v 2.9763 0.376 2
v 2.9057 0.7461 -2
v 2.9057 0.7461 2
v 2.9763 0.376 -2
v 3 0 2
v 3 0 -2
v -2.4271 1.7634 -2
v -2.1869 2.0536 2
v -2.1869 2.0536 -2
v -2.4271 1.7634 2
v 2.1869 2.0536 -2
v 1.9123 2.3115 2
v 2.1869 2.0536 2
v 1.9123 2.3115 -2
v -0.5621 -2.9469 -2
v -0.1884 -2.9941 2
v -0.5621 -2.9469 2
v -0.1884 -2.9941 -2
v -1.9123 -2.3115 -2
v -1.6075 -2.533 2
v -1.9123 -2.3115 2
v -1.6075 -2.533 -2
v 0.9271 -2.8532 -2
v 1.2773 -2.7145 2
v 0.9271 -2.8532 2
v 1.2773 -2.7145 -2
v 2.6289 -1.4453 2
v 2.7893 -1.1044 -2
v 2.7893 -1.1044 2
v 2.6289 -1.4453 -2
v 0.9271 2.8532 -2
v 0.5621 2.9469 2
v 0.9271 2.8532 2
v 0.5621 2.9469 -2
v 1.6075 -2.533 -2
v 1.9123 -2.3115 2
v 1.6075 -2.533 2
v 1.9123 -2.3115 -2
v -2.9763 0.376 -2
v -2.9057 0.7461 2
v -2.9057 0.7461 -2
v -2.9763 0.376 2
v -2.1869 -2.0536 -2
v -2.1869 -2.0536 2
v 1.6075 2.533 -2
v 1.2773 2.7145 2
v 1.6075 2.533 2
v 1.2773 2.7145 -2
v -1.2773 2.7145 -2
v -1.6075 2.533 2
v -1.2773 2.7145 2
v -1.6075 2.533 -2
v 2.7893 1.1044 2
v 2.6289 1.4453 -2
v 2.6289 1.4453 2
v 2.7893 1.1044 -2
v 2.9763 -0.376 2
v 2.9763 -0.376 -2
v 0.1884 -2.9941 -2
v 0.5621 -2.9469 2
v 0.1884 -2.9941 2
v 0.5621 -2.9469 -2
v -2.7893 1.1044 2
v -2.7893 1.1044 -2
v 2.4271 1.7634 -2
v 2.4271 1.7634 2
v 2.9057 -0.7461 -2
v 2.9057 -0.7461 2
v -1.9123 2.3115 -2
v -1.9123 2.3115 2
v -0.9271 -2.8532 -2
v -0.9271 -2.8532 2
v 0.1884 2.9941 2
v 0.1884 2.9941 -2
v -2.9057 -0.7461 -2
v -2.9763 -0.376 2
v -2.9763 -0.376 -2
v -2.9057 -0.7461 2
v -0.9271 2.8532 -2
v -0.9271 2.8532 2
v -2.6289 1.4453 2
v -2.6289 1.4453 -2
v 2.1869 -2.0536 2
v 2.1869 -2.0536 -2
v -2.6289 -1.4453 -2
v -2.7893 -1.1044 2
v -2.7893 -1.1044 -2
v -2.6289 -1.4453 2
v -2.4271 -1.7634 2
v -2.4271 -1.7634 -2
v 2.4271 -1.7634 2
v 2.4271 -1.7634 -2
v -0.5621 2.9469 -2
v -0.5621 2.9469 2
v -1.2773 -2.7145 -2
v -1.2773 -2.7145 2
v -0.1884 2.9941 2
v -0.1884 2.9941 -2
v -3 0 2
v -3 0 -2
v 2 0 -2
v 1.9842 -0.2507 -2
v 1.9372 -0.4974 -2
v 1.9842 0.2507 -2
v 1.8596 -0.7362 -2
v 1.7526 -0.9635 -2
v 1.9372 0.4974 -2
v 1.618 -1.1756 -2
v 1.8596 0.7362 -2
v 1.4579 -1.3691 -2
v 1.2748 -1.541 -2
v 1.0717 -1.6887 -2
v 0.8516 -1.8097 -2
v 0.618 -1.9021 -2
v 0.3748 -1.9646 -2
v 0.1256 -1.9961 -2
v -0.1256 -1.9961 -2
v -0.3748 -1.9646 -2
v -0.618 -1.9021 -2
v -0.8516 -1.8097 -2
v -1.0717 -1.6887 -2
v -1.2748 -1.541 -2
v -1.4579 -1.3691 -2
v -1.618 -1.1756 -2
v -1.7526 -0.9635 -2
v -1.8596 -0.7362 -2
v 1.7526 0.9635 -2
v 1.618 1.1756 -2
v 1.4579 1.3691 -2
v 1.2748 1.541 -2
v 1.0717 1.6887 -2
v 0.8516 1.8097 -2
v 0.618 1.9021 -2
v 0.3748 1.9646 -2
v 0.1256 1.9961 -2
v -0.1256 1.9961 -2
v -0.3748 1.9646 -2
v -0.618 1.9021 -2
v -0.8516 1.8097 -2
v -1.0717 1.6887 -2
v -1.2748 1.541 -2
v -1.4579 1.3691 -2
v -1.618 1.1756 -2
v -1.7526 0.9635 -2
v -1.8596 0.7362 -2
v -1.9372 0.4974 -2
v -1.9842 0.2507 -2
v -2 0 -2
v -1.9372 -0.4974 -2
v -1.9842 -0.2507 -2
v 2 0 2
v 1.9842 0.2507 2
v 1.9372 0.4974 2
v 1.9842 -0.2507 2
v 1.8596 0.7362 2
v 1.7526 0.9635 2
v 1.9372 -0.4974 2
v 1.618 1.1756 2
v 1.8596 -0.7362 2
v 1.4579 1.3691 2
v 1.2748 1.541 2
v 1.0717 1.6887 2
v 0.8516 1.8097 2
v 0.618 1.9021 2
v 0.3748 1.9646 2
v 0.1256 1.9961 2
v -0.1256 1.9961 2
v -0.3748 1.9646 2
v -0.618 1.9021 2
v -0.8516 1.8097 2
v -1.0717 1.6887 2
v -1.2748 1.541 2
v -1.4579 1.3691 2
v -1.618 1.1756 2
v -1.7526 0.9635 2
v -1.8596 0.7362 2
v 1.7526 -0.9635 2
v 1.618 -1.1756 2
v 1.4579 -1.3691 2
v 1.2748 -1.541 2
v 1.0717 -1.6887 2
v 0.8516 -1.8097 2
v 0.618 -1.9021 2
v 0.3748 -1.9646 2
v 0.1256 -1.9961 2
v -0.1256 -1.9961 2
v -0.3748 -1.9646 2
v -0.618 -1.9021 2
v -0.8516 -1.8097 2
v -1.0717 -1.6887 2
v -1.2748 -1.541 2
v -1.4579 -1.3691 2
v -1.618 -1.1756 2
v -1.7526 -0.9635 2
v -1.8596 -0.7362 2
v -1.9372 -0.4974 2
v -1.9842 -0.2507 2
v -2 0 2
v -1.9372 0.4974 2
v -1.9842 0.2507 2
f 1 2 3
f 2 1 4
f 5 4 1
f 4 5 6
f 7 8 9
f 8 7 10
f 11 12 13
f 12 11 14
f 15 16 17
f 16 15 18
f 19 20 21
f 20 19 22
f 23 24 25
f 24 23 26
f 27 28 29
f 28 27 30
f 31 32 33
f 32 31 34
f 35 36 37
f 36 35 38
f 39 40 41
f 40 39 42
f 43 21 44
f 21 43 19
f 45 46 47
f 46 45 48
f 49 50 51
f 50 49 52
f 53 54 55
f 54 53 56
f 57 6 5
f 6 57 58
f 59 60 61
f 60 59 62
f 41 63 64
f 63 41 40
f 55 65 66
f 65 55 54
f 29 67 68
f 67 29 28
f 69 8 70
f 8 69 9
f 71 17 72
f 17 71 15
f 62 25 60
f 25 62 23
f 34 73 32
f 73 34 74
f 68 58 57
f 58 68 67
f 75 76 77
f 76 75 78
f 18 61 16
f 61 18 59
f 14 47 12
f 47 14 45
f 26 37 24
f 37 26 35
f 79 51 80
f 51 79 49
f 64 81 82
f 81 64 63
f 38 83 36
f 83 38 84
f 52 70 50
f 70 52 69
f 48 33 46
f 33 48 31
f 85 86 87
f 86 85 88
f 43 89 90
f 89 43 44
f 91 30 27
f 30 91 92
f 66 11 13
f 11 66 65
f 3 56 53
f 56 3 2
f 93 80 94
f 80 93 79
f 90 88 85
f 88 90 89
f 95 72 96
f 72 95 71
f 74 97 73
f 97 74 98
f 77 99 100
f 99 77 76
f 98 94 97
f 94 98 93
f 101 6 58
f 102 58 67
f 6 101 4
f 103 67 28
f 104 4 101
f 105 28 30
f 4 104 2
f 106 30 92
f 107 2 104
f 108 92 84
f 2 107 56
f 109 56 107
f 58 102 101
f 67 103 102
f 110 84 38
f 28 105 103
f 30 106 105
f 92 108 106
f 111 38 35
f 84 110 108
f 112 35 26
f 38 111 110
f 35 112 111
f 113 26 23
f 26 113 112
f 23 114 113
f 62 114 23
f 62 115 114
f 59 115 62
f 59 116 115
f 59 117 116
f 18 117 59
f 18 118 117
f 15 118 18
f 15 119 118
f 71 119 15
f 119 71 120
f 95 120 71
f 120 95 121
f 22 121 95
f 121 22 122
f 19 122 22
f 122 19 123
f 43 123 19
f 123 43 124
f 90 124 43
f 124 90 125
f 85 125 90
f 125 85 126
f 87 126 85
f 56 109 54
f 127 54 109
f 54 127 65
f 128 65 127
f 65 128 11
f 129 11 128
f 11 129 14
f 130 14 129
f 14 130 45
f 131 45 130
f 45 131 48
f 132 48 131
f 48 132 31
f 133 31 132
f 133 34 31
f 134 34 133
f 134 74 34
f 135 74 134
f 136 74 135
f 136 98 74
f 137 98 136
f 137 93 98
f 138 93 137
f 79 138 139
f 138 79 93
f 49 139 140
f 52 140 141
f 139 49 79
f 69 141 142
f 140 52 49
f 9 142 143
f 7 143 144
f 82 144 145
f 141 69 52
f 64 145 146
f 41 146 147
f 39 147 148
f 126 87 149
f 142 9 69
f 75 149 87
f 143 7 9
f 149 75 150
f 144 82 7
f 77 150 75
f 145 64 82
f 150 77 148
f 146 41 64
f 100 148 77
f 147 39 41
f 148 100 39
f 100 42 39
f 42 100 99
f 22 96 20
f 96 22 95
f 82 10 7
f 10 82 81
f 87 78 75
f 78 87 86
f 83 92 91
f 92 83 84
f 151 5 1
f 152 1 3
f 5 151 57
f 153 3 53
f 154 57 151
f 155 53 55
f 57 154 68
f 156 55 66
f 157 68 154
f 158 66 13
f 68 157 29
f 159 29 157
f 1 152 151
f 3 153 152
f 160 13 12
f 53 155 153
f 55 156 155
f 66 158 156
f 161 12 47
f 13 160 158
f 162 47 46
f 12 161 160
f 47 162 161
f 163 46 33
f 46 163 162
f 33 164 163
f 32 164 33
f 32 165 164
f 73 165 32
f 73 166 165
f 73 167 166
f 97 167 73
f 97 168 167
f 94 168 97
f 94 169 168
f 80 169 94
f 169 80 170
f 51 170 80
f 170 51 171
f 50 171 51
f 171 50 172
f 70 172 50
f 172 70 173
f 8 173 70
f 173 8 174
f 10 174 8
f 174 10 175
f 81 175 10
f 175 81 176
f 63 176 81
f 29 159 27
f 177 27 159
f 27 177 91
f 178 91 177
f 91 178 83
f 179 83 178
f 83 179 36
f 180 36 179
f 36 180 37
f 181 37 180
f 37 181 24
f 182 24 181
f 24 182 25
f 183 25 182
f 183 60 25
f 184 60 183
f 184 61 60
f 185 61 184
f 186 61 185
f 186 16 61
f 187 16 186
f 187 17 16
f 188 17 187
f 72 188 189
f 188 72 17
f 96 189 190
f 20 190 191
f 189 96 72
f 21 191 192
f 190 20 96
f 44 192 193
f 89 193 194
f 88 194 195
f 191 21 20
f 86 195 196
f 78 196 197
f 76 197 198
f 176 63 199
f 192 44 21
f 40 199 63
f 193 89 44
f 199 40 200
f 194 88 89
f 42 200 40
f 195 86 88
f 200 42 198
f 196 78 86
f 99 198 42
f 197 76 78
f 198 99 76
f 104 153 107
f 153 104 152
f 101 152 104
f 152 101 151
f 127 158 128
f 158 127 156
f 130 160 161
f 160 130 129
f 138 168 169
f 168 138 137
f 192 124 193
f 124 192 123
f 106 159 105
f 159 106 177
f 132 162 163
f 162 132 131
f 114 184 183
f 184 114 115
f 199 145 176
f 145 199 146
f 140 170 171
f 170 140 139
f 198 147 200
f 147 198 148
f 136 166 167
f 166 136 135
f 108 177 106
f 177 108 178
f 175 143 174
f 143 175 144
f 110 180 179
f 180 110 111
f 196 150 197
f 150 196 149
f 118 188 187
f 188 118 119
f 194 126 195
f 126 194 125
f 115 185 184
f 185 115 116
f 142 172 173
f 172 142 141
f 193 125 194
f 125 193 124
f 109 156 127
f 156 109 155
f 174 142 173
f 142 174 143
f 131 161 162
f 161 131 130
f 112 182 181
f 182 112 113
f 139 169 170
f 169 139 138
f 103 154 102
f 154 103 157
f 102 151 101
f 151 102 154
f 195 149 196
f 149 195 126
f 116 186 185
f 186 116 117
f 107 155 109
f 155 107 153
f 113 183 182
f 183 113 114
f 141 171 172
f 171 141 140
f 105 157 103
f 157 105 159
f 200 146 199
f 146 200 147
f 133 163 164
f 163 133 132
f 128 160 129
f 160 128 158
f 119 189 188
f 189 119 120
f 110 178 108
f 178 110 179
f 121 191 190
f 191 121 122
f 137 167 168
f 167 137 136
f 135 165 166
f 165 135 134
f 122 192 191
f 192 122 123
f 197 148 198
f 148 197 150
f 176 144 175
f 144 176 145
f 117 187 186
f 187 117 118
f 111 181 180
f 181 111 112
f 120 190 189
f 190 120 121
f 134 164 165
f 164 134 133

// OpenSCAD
$fn = 50;


difference() {
	union() {
		translate(v = [0, 0, -2.0000000000]) {
			cylinder(h = 4, r = 3.0000000000);
		}
	}
	union() {
		translate(v = [0, 0, -100.0000000000]) {
			cylinder(h = 200, r = 2.0000000000);
		}
	}
}
